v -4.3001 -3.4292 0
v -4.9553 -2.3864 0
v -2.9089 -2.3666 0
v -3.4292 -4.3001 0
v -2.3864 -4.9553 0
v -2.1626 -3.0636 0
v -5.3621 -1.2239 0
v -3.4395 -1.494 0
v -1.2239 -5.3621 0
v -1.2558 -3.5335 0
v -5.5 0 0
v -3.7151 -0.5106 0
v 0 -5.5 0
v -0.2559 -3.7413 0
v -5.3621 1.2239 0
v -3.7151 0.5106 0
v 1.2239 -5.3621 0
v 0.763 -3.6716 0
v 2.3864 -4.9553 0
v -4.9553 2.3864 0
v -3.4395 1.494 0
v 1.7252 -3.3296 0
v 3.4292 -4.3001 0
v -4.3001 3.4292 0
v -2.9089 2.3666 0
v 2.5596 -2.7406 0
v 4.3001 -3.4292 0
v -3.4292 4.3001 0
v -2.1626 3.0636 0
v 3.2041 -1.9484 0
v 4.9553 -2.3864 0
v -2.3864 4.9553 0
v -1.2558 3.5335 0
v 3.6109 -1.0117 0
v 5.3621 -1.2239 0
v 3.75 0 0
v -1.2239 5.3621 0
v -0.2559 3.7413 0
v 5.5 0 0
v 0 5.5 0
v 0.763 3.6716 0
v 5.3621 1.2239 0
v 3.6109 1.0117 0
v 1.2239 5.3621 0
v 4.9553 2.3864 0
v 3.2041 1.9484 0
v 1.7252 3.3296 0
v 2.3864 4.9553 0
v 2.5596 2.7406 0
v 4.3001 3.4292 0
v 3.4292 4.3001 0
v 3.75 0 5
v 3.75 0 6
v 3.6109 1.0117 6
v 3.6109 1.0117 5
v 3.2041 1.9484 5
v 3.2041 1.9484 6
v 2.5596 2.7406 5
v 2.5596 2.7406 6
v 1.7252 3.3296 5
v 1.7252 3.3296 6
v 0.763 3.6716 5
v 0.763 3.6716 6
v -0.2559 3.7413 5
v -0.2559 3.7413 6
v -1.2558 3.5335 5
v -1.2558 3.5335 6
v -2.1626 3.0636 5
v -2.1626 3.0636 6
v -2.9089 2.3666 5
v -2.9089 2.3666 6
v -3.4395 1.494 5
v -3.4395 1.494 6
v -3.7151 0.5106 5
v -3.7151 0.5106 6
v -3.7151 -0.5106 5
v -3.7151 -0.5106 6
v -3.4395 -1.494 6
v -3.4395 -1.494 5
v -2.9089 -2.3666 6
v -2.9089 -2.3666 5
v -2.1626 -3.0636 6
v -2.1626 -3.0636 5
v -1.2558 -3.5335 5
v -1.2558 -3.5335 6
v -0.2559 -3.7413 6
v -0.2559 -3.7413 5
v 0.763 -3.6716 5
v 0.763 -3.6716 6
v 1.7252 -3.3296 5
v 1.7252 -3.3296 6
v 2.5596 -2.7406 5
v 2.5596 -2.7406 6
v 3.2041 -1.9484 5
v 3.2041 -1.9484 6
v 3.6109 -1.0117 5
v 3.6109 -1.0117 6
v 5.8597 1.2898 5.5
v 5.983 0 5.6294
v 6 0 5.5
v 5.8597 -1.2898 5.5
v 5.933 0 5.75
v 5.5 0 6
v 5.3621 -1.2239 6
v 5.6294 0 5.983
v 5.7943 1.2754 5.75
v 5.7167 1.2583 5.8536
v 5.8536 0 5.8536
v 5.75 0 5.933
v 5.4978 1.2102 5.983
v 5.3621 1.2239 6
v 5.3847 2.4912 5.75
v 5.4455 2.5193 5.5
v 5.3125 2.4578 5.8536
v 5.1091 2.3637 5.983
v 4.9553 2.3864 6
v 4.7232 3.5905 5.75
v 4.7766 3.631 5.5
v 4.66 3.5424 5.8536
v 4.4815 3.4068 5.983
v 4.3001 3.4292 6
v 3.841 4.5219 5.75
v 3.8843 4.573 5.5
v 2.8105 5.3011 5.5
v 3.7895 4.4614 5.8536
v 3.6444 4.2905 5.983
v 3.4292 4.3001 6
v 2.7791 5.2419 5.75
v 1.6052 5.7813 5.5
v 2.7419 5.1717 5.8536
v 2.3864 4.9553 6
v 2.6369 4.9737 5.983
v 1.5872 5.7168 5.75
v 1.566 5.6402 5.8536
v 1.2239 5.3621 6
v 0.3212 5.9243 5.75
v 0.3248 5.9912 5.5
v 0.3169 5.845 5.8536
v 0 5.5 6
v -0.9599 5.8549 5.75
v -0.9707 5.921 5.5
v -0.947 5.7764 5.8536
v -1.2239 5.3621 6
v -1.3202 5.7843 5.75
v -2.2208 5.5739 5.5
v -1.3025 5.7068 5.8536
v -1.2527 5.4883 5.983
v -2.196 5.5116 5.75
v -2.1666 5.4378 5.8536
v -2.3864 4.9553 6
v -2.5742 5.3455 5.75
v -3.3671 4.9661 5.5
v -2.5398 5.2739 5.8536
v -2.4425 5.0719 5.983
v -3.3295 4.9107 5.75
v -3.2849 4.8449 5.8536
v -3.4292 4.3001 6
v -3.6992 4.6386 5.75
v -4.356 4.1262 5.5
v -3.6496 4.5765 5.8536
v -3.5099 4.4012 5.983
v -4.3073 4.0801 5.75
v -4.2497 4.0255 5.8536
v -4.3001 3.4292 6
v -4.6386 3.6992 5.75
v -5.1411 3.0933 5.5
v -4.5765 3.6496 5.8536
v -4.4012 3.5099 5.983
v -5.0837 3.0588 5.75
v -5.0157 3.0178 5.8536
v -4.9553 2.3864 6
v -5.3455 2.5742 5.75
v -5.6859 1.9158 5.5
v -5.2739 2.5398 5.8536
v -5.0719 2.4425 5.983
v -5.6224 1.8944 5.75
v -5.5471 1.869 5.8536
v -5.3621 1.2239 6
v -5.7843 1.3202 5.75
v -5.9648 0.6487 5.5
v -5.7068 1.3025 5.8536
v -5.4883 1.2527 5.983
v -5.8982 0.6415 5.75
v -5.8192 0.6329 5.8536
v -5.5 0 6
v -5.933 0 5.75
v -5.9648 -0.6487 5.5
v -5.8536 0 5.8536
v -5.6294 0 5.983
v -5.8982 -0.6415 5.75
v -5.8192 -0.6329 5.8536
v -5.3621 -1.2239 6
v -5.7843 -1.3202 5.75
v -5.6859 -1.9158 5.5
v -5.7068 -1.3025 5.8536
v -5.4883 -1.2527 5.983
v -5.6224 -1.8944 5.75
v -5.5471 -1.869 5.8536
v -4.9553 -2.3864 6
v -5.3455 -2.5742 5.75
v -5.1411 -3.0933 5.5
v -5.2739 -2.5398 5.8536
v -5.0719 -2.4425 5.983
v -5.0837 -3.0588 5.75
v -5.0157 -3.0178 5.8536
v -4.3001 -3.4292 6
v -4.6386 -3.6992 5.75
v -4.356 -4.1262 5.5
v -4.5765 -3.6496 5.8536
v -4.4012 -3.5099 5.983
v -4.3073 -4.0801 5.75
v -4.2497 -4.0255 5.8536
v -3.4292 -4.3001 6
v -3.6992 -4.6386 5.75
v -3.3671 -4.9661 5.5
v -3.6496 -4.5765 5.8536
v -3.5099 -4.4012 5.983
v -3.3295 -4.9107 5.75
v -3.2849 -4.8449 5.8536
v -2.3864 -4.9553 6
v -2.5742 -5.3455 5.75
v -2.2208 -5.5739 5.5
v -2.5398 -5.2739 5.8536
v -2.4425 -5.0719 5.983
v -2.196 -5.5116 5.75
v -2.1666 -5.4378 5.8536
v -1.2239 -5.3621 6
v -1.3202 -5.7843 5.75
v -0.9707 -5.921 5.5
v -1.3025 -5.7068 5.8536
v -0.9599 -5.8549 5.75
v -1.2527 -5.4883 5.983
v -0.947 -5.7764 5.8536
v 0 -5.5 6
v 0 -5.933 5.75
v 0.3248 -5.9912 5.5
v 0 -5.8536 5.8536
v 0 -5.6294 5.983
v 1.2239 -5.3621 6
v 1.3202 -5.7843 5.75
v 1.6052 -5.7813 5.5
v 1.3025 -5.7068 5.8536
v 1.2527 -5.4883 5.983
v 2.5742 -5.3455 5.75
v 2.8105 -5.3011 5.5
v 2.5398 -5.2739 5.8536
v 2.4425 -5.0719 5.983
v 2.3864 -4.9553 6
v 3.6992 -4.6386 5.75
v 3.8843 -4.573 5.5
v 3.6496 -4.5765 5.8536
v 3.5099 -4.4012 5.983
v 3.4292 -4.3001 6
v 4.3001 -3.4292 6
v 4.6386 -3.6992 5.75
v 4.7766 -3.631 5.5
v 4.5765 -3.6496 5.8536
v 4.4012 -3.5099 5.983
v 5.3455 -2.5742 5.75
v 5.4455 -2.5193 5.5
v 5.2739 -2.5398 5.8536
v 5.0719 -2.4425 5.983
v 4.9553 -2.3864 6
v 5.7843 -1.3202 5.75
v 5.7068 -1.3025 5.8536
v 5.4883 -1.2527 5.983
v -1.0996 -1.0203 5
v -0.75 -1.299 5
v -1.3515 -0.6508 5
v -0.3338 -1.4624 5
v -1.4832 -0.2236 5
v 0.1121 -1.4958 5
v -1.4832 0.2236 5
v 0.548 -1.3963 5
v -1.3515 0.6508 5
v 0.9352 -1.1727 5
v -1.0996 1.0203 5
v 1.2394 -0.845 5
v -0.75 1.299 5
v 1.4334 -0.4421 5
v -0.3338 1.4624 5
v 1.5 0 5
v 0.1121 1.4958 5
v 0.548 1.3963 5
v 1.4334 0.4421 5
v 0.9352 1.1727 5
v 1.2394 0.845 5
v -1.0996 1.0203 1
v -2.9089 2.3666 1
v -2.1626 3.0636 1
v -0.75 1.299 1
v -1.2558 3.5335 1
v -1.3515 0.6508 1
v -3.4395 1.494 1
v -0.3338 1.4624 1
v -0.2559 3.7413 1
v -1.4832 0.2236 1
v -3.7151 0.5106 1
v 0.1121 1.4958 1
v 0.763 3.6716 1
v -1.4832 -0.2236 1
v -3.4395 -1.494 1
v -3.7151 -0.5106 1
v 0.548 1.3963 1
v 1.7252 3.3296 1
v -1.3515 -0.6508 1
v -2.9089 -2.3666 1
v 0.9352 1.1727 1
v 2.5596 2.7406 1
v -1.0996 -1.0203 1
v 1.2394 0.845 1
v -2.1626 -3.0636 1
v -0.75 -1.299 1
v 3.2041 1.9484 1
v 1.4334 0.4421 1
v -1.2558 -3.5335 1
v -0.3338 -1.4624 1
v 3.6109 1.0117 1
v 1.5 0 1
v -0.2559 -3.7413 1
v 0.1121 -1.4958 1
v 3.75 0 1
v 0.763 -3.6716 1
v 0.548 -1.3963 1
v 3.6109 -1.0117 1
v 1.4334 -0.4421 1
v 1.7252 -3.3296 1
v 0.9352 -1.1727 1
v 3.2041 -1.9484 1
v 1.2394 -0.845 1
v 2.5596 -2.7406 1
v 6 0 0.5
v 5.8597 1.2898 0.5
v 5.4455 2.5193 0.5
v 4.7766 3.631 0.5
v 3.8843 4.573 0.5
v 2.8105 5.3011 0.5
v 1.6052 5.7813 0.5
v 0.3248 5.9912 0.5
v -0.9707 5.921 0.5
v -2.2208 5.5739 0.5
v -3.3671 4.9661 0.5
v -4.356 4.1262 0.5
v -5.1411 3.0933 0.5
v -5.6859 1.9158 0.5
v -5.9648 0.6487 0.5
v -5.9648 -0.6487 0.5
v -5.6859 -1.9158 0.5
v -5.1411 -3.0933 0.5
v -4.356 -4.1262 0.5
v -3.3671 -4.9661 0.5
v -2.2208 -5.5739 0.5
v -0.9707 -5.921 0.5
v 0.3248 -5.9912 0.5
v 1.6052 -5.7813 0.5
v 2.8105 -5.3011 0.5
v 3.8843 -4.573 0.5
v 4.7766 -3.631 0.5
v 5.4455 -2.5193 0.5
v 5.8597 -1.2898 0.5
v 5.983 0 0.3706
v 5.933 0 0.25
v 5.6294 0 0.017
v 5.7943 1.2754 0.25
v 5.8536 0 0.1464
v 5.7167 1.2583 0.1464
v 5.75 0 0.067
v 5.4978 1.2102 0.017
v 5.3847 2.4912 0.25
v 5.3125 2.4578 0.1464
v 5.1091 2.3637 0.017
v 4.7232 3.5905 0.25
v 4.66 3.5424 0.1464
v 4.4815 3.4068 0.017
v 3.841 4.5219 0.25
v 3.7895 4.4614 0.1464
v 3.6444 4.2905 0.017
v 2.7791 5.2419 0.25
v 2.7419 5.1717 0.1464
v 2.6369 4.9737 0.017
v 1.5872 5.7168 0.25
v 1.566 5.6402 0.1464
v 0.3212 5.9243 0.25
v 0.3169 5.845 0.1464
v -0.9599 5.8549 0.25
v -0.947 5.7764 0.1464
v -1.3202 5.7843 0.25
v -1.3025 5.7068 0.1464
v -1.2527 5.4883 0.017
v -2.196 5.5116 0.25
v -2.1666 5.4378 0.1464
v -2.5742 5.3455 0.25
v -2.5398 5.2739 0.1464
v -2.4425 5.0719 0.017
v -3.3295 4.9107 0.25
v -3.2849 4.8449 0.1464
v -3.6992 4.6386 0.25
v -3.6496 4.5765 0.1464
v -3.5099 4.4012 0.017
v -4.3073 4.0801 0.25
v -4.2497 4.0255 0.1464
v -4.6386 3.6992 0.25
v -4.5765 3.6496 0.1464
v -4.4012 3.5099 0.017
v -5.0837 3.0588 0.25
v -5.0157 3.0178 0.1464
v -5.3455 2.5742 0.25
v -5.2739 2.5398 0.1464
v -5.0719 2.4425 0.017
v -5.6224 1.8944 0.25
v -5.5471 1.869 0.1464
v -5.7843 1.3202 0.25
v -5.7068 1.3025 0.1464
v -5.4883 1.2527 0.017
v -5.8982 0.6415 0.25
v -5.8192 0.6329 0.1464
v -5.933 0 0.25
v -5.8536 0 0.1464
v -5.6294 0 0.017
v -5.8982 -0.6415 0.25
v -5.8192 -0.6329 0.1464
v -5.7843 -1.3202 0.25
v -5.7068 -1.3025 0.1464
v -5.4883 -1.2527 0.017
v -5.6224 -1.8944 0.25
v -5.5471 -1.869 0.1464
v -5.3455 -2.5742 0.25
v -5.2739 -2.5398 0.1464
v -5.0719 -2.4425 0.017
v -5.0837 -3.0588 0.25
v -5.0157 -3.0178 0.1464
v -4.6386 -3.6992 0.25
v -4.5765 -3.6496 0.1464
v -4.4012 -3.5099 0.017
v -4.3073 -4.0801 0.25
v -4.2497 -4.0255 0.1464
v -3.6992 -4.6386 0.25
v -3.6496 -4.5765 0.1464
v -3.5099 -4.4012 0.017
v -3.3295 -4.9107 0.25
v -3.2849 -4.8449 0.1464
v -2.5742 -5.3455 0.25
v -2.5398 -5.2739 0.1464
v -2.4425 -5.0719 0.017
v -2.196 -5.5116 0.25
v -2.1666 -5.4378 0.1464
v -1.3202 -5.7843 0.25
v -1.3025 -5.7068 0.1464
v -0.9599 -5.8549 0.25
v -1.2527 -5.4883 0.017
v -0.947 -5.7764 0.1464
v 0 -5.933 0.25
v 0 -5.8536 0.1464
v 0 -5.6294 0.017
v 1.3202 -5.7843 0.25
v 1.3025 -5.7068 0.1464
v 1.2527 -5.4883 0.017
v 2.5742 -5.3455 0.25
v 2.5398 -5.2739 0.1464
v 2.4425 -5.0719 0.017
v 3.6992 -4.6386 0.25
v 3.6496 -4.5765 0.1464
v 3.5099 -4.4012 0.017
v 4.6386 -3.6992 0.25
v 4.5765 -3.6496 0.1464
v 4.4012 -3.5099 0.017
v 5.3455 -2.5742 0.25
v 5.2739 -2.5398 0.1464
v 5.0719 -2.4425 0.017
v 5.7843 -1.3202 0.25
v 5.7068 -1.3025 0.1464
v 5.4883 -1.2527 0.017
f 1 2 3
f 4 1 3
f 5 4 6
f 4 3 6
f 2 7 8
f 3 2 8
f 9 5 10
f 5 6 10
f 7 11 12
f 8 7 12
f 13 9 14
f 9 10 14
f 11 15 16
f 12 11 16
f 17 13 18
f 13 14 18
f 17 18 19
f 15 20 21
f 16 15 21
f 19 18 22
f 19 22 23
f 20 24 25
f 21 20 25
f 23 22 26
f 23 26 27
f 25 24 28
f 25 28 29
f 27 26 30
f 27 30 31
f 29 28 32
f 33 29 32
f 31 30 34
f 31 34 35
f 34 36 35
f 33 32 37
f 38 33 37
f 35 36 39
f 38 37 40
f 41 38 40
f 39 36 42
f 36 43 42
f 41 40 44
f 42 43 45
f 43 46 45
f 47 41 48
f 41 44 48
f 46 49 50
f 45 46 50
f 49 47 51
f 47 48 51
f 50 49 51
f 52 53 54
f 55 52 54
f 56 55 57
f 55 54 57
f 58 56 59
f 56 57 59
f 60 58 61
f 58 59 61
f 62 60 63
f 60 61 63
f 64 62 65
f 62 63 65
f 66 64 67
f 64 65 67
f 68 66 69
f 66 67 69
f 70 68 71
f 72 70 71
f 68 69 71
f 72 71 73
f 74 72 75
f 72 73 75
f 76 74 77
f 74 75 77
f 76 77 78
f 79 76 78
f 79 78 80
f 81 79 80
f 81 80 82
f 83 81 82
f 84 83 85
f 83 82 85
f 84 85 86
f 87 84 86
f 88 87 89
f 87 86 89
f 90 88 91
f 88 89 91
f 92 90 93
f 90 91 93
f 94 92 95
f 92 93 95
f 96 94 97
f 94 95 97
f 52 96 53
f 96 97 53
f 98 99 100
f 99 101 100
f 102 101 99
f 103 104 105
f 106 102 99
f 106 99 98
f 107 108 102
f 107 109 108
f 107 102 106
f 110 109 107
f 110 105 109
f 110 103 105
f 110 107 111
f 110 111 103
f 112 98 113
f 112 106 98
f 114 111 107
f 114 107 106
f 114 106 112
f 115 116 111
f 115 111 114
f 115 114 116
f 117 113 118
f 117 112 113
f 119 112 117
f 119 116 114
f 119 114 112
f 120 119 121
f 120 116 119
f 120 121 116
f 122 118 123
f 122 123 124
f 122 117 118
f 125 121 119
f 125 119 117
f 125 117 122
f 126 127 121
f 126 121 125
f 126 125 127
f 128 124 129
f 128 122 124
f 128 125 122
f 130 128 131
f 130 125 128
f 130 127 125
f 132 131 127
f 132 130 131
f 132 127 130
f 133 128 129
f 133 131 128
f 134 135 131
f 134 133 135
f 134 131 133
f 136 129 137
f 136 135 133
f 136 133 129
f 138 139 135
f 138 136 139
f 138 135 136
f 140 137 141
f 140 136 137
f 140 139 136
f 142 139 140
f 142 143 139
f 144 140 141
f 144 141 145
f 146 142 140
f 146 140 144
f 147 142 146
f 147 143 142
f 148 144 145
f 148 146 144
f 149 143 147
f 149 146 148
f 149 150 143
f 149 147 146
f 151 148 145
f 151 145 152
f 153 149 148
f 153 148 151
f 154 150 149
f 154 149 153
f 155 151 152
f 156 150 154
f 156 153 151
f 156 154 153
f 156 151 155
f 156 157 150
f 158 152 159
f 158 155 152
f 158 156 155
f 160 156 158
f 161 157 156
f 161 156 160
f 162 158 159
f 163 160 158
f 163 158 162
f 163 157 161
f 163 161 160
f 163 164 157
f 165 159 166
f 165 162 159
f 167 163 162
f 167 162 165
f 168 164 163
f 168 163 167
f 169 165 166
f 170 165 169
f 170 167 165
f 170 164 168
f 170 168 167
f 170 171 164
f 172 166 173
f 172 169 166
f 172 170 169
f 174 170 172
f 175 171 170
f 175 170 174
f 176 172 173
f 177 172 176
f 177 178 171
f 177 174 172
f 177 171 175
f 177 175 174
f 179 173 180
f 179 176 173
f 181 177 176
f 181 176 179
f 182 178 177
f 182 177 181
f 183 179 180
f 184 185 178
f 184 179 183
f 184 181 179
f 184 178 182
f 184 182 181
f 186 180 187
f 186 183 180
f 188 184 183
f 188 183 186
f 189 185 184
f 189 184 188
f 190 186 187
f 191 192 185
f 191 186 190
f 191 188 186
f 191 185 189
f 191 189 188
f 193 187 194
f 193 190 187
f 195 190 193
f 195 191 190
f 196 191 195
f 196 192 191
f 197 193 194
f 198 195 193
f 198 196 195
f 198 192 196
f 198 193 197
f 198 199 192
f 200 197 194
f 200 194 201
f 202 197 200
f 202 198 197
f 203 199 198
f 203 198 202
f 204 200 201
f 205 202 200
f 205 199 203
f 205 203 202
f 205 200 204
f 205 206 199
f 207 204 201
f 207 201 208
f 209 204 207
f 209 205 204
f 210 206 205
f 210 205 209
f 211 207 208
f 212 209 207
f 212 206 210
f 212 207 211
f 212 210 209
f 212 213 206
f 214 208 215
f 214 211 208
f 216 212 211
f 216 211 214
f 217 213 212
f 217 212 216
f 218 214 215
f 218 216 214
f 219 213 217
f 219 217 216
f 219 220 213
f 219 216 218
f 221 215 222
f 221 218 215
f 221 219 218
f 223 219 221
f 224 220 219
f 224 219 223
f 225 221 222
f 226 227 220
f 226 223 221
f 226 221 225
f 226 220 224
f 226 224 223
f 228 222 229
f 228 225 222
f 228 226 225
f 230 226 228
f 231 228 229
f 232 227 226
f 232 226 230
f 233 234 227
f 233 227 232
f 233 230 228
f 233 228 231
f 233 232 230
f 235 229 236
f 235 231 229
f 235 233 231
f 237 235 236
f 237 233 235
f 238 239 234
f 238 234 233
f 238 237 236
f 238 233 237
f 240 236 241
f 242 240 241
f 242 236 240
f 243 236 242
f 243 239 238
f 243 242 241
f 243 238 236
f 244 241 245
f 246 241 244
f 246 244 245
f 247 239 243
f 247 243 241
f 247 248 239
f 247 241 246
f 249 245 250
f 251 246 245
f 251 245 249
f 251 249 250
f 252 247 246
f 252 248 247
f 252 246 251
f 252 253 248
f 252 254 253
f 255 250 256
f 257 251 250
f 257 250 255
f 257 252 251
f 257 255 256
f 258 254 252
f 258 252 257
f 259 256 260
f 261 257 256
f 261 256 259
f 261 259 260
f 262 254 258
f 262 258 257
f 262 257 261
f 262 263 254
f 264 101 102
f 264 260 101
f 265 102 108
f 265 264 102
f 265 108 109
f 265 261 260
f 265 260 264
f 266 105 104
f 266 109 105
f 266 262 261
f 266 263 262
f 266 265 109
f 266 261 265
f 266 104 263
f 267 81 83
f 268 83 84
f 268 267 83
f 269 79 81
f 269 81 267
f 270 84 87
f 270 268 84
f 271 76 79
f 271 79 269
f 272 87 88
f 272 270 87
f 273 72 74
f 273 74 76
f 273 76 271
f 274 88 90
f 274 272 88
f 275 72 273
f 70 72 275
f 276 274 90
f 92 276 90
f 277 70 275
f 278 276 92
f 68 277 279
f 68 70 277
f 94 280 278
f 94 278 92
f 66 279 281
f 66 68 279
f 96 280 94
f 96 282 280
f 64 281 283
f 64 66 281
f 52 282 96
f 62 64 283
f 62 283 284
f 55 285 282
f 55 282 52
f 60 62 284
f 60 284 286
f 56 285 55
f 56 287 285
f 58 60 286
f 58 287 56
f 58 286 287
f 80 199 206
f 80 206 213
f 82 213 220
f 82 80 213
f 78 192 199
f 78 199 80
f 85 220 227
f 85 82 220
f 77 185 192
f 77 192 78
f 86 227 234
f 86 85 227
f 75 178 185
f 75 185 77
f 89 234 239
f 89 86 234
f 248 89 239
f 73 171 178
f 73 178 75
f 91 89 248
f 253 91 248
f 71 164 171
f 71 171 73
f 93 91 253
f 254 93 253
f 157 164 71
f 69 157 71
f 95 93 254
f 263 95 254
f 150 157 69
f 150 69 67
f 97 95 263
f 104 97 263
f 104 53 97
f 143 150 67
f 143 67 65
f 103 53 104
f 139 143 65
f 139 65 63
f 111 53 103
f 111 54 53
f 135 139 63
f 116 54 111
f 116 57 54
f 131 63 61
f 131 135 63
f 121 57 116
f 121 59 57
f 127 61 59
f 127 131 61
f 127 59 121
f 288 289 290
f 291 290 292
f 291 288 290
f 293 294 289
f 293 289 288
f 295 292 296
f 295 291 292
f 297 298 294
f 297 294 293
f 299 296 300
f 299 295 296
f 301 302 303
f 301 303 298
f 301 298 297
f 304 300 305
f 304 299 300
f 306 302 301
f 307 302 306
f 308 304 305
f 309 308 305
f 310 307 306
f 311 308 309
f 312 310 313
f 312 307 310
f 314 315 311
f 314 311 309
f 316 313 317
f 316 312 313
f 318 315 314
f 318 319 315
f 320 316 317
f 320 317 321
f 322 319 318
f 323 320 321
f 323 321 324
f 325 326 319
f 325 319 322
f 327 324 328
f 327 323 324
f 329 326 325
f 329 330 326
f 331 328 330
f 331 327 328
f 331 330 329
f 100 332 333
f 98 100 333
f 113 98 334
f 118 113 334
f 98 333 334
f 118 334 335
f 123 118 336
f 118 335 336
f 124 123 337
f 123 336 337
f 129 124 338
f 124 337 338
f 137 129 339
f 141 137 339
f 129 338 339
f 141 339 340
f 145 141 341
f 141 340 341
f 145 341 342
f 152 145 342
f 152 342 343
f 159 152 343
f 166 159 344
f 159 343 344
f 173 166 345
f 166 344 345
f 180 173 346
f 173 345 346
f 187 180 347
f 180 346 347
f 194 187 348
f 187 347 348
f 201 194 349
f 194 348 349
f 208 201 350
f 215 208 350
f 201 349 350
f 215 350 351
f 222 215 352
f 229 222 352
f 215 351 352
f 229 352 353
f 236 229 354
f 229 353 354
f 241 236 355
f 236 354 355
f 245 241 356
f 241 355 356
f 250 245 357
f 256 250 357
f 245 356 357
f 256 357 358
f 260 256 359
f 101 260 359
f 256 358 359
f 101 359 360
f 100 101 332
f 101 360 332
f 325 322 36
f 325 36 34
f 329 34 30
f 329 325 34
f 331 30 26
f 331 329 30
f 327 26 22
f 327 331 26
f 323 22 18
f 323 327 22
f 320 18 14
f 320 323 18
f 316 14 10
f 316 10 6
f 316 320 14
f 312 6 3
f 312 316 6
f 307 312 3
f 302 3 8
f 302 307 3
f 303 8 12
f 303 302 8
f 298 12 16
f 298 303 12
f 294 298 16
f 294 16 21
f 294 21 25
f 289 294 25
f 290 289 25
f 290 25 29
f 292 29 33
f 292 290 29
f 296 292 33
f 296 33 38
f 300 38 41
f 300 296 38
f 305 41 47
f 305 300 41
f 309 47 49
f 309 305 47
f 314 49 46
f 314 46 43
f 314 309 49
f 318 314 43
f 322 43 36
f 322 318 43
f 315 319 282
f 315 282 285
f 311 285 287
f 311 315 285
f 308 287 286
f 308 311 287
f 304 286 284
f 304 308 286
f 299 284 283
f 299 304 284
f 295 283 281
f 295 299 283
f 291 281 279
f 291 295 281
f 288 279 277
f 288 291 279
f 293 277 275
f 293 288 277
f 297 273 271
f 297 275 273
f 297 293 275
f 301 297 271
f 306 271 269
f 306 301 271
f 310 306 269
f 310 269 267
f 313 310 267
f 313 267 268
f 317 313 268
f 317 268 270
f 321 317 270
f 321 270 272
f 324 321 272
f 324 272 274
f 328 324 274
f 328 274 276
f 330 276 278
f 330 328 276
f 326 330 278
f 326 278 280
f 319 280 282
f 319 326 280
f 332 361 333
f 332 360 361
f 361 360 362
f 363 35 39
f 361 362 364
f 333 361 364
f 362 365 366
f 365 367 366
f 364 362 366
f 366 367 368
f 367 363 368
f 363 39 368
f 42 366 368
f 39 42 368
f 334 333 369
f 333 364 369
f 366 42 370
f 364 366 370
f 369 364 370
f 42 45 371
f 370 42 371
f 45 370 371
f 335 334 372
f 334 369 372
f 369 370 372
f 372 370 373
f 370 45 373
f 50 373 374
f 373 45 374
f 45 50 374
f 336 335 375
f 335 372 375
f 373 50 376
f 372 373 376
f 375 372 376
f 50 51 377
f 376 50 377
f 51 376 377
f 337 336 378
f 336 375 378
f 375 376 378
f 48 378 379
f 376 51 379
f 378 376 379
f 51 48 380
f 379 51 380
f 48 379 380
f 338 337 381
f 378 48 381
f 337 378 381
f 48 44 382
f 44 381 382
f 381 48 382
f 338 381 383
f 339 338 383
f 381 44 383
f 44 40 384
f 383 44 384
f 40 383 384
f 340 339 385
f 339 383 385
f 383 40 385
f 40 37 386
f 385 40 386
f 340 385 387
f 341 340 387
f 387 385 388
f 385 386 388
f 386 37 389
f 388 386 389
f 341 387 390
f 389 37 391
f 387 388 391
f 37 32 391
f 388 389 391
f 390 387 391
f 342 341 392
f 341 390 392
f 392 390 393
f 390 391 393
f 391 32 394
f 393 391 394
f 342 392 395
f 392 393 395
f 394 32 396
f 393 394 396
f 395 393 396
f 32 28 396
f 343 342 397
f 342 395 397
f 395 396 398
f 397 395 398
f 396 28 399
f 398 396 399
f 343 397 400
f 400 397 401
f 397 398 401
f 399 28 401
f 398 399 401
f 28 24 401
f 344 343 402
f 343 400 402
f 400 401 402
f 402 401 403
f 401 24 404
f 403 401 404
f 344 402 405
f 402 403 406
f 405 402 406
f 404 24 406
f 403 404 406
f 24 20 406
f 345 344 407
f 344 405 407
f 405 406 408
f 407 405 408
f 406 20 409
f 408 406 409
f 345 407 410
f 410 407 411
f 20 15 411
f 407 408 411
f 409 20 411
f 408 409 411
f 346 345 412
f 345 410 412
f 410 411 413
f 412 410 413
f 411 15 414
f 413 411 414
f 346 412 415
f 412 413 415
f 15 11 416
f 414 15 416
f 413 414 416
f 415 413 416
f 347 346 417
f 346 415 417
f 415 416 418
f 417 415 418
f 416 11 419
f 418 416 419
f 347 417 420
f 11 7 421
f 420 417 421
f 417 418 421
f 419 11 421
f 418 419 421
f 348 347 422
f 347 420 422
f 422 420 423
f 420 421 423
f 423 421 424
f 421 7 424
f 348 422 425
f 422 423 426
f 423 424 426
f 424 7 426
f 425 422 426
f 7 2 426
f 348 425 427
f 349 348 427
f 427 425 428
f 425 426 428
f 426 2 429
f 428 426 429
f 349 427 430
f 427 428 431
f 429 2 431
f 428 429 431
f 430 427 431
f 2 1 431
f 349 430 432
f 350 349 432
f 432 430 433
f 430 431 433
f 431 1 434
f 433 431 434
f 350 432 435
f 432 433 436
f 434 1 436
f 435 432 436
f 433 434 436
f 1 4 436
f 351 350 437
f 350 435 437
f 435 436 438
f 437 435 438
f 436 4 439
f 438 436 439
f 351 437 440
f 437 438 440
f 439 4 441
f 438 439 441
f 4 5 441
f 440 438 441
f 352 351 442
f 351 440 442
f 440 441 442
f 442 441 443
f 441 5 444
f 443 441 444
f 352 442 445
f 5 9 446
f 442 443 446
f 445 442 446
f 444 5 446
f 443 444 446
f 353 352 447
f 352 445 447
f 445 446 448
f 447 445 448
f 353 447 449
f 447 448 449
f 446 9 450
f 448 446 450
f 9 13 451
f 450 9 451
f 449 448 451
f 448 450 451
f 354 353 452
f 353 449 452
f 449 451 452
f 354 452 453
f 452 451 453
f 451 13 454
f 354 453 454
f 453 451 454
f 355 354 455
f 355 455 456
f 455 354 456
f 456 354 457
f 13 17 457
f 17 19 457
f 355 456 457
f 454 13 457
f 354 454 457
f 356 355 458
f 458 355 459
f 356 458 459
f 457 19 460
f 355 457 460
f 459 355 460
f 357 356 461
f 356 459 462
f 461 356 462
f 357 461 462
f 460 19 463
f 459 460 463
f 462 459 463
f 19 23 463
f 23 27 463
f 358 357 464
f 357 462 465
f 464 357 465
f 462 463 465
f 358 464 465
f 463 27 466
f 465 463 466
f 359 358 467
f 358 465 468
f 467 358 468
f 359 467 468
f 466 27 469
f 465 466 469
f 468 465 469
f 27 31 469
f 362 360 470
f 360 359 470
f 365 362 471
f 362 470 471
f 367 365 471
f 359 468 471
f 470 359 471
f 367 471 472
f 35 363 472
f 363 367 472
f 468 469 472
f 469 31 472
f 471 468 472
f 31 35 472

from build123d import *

# Parameters (mm, degrees)
SKETCH_1_R          = 6
SKETCH_1_R_2        = 1.5
EXTRUDE_1_DEPTH     = 6
SKETCH_2_R          = 3.75
CUT_EXTRUDE_1_DEPTH = 1
CUT_EXTRUDE_START   = -1
SKETCH_3_R          = 3.75
CUT_EXTRUDE_2_DEPTH = 1
FILLET_1_R          = 0.5


with BuildPart() as part:
    # 草图1 → 凸台-拉伸1 (new body)
    with BuildSketch(Plane.XY):
        Circle(SKETCH_1_R)
        Circle(SKETCH_1_R_2, mode=Mode.SUBTRACT)
    extrude(amount=EXTRUDE_1_DEPTH)

    # 草图2 → 切除-拉伸1 (cut)
    with BuildSketch(Plane.XY.offset(6)):
        Circle(SKETCH_2_R)
    extrude(amount=-CUT_EXTRUDE_1_DEPTH, mode=Mode.SUBTRACT)

    # 草图3 → 切除-拉伸2 (cut)
    with BuildSketch(Plane(origin=(0, 0, 0), x_dir=(-1, 0, 0), z_dir=(0, 0, -1)).offset(CUT_EXTRUDE_START)):
        with Locations(Location((0, 0, 0), (0, 0, 180))):
            Circle(SKETCH_3_R)
    extrude(amount=CUT_EXTRUDE_2_DEPTH, mode=Mode.SUBTRACT)

    # 圆角1
    fillet_1_edges = [part.edges().sort_by_distance(p)[0] for p in [
        (-6, 0, 0),
        (-6, 0, 6),
    ]]
    fillet(fillet_1_edges, radius=FILLET_1_R)


solid = part.part
